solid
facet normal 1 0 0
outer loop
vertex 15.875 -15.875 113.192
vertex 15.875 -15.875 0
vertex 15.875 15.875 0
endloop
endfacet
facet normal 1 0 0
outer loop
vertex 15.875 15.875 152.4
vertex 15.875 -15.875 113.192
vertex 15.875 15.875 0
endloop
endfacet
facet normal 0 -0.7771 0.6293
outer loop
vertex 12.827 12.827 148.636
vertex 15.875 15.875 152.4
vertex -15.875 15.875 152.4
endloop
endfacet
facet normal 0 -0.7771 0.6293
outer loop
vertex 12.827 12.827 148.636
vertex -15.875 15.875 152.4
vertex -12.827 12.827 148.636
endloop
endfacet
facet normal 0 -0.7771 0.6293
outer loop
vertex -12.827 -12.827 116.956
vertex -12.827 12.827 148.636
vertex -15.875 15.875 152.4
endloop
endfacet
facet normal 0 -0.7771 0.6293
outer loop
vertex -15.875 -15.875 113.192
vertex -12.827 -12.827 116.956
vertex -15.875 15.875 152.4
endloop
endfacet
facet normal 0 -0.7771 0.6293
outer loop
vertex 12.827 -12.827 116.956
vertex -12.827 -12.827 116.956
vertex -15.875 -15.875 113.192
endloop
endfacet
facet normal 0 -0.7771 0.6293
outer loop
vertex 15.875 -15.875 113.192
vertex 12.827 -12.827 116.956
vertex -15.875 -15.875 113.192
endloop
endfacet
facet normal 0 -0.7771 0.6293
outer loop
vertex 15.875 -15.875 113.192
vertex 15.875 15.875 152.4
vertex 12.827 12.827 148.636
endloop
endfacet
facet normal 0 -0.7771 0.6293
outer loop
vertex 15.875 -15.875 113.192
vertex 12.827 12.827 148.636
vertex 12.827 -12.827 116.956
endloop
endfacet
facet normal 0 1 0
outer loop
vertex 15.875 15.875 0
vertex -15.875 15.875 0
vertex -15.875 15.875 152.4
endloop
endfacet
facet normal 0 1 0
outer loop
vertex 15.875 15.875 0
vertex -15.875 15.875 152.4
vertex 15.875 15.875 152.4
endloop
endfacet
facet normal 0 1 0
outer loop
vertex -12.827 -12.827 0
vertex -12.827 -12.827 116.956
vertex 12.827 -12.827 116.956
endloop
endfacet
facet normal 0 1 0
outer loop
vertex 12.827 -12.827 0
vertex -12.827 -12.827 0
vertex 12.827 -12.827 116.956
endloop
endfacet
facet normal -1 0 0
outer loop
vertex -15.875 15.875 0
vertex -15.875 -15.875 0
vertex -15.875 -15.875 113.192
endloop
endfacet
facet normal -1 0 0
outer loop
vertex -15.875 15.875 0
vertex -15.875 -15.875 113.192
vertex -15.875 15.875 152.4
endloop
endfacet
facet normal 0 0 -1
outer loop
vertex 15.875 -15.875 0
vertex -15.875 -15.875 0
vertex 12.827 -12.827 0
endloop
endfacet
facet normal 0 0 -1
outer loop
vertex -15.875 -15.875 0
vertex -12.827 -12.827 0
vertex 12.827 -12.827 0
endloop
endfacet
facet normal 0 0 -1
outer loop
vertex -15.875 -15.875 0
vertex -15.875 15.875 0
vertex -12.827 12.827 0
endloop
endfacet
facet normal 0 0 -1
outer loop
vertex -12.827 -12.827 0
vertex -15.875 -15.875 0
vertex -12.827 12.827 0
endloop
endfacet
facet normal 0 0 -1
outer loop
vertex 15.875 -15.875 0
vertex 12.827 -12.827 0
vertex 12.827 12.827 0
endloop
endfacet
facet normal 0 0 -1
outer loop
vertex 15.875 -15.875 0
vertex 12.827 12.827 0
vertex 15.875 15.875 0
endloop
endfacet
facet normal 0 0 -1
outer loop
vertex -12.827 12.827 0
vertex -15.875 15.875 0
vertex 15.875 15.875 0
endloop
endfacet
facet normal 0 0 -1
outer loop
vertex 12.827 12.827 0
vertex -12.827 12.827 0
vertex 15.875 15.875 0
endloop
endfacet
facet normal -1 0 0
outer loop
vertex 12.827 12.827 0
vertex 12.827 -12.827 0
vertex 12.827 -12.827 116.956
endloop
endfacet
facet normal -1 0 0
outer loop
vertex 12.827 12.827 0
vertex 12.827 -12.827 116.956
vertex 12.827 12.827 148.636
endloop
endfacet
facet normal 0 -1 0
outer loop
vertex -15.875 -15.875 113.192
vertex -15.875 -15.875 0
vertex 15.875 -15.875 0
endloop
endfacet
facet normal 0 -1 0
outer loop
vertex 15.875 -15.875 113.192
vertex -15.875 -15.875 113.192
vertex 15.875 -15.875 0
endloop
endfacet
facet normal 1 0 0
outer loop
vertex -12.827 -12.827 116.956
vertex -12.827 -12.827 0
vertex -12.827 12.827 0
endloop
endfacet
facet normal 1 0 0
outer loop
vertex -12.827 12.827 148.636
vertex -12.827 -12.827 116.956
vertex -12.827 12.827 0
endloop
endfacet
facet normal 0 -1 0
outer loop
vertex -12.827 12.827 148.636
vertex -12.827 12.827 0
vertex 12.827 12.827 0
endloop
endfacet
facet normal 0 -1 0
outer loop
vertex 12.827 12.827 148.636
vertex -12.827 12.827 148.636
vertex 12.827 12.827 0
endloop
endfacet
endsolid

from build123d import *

# Parameters (mm, degrees)
SKETCH1_W               = 31.75
SKETCH1_H               = 31.75
SKETCH1_W_2             = 25.654
SKETCH1_H_2             = 25.654
BOSS_EXTRUDE1_DEPTH     = 152.4
CUT_EXTRUDE1_DEPTH      = 16.875
CUT_EXTRUDE1_DEPTH_BACK = 16.875


with BuildPart() as part:
    # Sketch1 → Boss-Extrude1 (new body)
    with BuildSketch(Plane.XY):
        Rectangle(SKETCH1_W, SKETCH1_H)
        Rectangle(SKETCH1_W_2, SKETCH1_H_2, mode=Mode.SUBTRACT)
    extrude(amount=BOSS_EXTRUDE1_DEPTH)

    # Sketch2 → Cut-Extrude1 (cut, two sides)
    with BuildSketch(Plane(origin=(0, 0, 0), x_dir=(0, 0, -1), z_dir=(1, 0, 0))) as cut_extrude1_sk:
        Polygon((-152.4, 15.875), (-113.19201528, -15.875), (-152.4, -15.875), align=None)
    extrude(amount=CUT_EXTRUDE1_DEPTH, mode=Mode.SUBTRACT)
    extrude(cut_extrude1_sk.sketch, amount=-CUT_EXTRUDE1_DEPTH_BACK, mode=Mode.SUBTRACT)


solid = part.part
